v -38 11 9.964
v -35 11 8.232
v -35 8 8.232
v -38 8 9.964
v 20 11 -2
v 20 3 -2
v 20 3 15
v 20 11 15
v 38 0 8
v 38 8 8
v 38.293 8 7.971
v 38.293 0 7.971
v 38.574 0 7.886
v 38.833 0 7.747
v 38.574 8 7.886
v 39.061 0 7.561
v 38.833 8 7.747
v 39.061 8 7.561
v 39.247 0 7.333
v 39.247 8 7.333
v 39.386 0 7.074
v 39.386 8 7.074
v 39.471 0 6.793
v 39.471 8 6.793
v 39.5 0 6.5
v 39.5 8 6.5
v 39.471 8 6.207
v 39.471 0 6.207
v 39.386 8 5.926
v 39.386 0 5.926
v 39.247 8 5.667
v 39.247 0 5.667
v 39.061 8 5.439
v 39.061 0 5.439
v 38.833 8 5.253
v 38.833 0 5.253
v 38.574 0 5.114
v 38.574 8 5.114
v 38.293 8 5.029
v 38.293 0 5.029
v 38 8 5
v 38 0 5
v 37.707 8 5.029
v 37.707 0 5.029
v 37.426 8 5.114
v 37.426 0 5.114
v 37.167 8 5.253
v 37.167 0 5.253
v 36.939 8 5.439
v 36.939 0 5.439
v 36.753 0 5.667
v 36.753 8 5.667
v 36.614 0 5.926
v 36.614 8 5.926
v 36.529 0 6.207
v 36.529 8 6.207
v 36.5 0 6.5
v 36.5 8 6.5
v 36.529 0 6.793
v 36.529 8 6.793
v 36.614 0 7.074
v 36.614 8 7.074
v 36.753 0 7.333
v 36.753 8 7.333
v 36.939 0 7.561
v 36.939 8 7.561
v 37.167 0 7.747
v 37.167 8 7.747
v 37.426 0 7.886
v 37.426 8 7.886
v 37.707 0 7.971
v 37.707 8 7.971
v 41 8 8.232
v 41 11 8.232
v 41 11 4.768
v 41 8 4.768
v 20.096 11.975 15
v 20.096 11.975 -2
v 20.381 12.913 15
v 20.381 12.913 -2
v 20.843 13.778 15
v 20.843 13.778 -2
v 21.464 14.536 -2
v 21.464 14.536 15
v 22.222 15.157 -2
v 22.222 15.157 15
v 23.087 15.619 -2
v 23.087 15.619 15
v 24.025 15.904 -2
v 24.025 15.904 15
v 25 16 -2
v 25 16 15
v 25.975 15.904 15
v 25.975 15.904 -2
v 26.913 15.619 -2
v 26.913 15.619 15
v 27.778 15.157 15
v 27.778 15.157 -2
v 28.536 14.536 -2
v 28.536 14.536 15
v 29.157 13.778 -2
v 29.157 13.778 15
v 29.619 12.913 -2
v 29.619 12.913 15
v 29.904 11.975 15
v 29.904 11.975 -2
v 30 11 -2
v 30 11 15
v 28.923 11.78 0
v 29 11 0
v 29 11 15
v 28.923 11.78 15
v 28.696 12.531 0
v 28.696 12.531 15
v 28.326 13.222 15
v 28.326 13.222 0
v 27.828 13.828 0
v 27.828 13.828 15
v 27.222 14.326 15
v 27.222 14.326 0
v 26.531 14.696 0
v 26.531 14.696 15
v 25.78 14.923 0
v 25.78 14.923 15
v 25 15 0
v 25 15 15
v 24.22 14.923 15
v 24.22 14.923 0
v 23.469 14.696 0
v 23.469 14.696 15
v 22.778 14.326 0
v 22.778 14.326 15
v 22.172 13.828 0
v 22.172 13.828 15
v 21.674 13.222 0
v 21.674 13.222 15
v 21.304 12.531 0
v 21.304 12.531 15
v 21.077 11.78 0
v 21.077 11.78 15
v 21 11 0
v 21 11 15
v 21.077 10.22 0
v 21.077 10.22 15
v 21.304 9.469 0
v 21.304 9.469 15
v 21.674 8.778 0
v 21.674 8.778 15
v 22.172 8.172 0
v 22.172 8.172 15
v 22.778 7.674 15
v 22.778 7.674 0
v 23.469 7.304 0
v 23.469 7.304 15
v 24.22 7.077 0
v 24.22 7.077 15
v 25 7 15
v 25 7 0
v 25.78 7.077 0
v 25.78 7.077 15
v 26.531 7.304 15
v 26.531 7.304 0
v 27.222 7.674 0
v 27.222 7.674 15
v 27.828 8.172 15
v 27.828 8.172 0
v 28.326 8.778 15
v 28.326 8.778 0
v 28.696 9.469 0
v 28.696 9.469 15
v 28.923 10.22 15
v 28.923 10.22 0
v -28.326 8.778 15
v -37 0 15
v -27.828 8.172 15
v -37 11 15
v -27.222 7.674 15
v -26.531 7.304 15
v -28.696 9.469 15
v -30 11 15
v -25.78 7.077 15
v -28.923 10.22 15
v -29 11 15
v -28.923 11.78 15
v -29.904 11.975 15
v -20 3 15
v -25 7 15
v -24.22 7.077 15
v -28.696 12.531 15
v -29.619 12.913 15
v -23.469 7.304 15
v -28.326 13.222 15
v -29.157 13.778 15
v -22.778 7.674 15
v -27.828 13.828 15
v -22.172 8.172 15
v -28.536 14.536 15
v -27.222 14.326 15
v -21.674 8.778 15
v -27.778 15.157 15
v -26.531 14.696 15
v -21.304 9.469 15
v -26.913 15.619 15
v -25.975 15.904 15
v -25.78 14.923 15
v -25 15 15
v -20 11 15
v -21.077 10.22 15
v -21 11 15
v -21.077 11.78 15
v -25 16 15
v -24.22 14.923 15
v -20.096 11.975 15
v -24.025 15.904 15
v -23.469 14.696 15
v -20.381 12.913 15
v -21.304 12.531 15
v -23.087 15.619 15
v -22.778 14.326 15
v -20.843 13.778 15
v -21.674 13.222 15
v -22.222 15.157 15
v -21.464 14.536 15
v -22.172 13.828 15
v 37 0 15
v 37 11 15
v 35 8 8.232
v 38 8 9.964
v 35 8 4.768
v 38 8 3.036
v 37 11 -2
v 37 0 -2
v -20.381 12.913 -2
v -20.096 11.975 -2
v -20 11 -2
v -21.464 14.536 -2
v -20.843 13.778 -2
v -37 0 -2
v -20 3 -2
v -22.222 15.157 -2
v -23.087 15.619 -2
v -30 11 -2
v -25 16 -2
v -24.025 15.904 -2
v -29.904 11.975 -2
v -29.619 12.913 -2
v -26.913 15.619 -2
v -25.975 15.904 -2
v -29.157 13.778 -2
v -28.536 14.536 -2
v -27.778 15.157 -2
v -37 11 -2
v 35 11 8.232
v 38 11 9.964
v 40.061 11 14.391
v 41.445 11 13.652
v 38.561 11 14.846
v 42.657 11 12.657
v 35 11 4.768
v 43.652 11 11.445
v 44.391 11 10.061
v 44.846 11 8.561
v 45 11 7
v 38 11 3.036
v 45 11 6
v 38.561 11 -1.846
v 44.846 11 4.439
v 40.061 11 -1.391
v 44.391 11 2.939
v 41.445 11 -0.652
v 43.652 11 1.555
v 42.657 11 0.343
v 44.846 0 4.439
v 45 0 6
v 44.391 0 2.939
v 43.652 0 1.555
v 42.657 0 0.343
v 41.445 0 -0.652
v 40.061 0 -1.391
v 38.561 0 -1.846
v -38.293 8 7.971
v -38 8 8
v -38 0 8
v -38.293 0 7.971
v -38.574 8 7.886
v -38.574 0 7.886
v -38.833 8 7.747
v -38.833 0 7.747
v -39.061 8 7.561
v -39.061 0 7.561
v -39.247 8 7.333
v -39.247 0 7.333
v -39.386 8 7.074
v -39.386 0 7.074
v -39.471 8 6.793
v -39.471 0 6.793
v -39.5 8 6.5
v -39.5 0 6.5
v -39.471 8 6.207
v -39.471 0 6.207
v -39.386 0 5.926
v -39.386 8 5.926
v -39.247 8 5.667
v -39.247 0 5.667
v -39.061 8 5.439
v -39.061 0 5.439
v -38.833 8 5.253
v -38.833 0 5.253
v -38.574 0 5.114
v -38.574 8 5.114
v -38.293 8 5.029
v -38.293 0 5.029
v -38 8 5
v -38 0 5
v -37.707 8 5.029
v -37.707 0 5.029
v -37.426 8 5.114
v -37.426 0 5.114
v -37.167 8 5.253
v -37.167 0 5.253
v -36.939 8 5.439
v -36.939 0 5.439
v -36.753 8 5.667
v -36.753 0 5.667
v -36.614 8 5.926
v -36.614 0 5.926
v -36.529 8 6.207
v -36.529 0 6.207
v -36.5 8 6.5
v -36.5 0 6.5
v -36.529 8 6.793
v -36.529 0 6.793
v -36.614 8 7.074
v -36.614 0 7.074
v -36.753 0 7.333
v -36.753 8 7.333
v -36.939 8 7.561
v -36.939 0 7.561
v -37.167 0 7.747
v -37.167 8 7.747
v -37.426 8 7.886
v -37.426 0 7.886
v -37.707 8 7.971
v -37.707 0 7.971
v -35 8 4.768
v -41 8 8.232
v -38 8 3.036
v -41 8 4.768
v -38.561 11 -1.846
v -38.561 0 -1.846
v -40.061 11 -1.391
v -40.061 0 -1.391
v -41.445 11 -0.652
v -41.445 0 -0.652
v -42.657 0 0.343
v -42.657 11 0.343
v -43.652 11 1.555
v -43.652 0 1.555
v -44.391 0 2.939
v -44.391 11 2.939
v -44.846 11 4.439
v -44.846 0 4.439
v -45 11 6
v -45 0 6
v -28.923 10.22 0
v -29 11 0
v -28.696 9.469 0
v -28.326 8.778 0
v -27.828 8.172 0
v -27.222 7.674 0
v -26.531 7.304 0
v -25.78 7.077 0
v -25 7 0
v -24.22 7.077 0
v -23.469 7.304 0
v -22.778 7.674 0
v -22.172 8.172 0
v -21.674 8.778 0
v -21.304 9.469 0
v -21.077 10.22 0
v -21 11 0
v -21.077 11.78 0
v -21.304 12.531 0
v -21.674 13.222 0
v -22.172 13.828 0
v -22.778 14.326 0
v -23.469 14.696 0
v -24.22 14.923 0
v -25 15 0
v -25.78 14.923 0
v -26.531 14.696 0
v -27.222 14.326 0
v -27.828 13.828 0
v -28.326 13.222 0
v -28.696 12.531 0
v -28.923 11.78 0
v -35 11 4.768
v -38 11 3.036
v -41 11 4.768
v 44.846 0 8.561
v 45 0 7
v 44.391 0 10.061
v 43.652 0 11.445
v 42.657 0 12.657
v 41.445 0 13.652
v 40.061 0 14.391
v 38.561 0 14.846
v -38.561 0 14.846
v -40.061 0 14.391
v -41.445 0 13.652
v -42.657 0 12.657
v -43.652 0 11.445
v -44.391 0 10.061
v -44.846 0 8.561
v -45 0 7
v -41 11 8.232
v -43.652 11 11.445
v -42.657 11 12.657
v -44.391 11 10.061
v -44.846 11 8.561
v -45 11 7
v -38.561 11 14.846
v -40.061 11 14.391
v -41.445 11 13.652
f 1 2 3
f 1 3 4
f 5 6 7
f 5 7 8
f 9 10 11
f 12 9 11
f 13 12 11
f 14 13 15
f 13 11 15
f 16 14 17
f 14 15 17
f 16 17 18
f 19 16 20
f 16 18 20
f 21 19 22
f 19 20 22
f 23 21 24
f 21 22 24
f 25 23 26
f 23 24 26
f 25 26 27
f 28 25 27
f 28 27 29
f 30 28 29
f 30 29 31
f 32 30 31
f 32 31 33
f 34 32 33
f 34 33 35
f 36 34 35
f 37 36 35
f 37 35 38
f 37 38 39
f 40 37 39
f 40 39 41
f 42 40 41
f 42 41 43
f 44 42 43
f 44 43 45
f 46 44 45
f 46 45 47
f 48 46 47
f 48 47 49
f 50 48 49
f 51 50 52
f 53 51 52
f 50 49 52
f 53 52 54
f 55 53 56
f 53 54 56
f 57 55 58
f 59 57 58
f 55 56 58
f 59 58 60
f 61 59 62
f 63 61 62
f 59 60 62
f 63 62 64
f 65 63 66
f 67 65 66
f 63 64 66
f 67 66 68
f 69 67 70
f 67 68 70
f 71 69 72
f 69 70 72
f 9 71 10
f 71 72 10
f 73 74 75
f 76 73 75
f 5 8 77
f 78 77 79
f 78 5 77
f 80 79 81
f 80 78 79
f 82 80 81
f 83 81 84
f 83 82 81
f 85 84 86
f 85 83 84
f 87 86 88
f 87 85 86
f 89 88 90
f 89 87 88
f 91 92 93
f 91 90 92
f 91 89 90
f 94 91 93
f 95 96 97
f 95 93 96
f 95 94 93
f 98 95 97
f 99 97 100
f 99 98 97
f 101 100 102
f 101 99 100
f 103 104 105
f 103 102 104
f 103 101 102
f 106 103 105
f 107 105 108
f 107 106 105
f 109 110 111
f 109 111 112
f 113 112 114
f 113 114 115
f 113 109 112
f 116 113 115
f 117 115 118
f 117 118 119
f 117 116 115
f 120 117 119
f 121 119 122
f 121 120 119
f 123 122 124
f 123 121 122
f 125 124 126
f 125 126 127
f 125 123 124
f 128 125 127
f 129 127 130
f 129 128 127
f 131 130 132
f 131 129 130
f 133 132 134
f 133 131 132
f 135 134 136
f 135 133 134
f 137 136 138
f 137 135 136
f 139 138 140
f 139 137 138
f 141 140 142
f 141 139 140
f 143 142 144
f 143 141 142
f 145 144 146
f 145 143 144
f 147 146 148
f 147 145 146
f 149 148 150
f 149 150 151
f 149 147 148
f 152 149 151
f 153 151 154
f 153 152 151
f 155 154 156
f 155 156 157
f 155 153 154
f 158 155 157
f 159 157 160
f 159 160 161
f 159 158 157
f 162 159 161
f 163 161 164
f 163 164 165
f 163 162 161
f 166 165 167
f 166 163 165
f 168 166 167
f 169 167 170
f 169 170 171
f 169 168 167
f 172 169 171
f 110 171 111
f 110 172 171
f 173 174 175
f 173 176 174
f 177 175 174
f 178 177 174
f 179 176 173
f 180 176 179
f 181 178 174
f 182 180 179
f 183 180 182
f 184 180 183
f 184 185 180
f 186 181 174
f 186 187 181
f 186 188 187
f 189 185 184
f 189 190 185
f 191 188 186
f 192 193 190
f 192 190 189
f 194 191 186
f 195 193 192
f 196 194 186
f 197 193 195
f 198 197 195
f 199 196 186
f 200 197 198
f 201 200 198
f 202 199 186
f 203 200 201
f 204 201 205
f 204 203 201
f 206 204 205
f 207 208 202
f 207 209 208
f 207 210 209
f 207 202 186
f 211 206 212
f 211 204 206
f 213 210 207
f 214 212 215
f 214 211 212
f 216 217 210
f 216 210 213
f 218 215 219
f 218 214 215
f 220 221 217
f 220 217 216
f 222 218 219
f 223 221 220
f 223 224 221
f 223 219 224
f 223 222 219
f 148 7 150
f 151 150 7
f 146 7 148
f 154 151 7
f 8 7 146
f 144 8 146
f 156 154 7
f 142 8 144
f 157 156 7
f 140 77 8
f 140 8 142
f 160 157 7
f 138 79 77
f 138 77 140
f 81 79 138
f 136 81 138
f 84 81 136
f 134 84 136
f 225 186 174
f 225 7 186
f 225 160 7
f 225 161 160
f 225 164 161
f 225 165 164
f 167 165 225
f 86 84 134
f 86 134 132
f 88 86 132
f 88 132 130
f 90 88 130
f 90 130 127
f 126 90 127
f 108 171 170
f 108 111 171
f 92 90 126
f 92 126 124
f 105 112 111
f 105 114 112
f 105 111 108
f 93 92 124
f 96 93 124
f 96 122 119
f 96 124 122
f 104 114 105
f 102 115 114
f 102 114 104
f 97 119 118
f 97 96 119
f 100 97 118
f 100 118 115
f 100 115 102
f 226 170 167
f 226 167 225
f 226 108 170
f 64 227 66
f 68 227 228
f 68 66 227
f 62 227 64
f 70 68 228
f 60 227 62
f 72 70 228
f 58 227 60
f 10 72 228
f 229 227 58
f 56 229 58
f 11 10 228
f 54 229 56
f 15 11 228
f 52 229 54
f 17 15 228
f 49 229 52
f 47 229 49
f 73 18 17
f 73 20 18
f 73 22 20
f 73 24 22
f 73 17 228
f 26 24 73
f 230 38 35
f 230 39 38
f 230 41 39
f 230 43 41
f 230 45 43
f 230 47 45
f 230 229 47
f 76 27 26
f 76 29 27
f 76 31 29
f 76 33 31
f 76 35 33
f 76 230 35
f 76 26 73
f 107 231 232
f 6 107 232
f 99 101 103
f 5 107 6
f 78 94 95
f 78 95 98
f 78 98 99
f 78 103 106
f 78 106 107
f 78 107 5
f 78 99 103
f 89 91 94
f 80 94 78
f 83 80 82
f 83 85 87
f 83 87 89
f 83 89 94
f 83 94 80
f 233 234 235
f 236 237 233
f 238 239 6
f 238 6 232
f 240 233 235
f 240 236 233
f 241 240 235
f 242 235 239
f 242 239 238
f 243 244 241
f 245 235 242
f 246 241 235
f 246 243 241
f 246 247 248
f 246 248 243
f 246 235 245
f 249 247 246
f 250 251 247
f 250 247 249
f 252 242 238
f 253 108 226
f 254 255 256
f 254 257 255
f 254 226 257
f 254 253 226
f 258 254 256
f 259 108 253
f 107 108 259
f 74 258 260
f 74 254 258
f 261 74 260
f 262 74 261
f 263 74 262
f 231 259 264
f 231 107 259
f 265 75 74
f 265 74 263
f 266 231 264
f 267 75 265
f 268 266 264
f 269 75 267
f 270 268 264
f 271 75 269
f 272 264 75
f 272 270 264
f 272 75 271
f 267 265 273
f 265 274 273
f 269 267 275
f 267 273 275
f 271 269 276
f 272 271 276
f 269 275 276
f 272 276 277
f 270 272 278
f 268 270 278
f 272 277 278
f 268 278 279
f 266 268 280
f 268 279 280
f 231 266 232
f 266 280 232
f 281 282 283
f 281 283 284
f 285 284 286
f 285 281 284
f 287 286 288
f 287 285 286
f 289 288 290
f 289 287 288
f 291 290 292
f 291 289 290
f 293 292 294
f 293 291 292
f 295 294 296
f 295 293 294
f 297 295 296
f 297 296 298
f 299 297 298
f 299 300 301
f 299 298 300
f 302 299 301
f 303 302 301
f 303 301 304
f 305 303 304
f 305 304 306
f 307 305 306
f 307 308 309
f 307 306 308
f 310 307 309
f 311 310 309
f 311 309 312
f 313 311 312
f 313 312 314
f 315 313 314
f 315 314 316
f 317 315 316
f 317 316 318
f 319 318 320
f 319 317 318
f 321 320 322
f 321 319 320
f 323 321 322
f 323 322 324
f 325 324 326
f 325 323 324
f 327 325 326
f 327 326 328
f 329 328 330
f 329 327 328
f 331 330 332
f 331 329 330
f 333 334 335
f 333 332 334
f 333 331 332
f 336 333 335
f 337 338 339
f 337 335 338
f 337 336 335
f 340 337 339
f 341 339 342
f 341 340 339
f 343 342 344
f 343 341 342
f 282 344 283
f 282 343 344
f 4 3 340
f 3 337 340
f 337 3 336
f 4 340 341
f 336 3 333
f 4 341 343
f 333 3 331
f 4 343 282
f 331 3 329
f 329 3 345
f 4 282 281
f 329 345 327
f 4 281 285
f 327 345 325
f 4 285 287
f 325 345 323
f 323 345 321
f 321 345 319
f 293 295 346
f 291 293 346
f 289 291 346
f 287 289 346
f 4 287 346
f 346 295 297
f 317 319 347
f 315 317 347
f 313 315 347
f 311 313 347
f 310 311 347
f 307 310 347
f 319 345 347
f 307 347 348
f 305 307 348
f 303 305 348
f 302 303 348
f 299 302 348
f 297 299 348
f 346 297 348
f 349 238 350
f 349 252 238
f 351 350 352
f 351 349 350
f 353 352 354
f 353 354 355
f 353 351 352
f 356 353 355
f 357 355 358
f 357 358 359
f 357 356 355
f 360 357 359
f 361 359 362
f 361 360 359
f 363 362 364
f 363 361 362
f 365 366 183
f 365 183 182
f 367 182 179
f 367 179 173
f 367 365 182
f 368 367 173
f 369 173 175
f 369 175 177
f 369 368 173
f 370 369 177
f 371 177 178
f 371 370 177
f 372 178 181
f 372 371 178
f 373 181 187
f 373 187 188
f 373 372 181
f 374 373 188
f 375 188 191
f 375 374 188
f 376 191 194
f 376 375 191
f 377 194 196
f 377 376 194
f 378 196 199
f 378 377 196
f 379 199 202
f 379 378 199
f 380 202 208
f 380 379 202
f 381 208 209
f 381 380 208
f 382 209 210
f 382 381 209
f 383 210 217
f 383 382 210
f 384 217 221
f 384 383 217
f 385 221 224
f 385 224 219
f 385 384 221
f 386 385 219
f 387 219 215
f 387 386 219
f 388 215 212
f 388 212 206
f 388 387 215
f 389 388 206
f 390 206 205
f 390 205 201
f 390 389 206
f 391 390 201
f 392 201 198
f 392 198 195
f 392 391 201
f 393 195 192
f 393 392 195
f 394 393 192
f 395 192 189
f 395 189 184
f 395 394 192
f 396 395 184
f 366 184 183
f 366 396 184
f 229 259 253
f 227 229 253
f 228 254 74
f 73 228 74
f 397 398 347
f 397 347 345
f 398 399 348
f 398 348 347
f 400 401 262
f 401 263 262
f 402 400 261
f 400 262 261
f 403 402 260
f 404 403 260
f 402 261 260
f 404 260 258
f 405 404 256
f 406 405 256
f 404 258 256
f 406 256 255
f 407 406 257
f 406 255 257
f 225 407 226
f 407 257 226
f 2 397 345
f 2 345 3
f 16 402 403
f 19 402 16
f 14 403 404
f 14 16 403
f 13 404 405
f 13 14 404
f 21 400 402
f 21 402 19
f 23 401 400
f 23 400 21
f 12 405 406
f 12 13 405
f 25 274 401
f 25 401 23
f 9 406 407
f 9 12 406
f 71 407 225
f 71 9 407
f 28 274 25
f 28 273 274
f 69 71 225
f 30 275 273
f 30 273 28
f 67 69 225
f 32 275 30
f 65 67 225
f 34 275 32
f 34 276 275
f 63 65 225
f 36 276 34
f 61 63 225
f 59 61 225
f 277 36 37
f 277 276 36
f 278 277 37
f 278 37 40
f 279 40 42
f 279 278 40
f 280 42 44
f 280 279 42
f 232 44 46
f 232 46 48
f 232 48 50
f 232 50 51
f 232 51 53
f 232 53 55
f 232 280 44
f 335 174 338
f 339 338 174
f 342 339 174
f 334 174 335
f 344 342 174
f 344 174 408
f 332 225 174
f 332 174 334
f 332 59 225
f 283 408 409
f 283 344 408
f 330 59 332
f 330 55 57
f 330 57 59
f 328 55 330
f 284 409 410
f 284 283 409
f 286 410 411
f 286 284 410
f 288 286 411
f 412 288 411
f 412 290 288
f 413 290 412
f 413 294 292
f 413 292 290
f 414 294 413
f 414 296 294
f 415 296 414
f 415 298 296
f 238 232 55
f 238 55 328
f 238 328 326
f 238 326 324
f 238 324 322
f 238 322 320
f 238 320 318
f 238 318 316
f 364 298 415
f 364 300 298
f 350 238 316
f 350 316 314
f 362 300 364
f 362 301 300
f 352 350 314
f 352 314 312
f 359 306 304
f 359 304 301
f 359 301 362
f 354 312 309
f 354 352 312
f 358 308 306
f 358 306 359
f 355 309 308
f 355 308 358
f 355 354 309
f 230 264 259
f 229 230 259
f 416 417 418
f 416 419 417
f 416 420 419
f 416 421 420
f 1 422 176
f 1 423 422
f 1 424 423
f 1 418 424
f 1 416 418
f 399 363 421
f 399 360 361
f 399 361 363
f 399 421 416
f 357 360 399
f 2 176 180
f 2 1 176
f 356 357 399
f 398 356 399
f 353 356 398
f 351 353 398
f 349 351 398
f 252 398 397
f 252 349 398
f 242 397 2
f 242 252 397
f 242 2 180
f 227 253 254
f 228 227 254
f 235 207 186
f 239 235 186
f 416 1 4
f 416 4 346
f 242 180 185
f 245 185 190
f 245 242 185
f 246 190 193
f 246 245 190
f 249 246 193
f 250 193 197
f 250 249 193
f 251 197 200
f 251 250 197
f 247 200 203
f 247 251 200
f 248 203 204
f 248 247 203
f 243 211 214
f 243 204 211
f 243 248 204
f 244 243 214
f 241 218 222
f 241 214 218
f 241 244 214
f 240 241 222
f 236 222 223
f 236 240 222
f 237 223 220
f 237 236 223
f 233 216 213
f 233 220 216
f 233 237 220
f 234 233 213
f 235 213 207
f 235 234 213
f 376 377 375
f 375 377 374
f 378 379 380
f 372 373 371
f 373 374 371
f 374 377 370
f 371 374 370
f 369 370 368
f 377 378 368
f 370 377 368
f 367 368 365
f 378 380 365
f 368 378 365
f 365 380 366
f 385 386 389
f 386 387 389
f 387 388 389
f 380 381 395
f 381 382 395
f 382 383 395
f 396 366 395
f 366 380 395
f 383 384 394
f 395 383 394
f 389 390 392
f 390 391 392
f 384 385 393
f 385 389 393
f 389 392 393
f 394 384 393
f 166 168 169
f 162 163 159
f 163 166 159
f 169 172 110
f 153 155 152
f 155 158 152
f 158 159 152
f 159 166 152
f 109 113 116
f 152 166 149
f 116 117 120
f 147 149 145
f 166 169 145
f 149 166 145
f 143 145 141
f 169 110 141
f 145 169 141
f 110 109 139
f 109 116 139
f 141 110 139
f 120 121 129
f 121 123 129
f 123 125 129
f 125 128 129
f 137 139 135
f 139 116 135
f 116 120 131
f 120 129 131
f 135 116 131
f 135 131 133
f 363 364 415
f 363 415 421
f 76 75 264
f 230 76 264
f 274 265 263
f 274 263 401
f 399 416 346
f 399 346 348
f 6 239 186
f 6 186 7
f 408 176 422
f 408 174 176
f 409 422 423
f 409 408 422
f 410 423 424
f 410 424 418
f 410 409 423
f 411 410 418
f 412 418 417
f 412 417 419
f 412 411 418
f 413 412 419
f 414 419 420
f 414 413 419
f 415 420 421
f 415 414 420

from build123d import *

# Parameters (mm, degrees)
SKETCH1_R           = 4
BOSS_EXTRUDE1_DEPTH = 15
BOSS_EXTRUDE2_START = 2
BOSS_EXTRUDE2_DEPTH = 2
SKETCH3_R           = 1.5
CUT_EXTRUDE1_DEPTH  = 49.692915296
FILLET1_R           = 8
CUT_EXTRUDE2_DEPTH  = 3


with BuildPart() as part:
    # Sketch1 → Boss-Extrude1 (new body)
    with BuildSketch(Plane.XY):
        with BuildLine():
            Line((-45, 0), (45, 0))
            Line((45, 0), (45, 11))
            Line((45, 11), (30, 11))
            ThreePointArc((30, 11), (25, 16), (20, 11))
            Line((20, 11), (20, 3))
            Line((20, 3), (-20, 3))
            Line((-20, 3), (-20, 11))
            ThreePointArc((-20, 11), (-25, 16), (-30, 11))
            Line((-30, 11), (-45, 11))
            Line((-45, 11), (-45, 0))
        make_face()
        with Locations((25, 11)):
            Circle(SKETCH1_R, mode=Mode.SUBTRACT)
        with Locations(Location((-25, 11, 0), (0, 0, 180))):
            Circle(SKETCH1_R, mode=Mode.SUBTRACT)
    extrude(amount=BOSS_EXTRUDE1_DEPTH)

    # Sketch2 → Boss-Extrude2 (add)
    with BuildSketch(Plane(origin=(0, 0, 0), x_dir=(-1, 0, 0), z_dir=(0, 0, -1)).offset(BOSS_EXTRUDE2_START)):
        with BuildLine():
            Line((-45, 11), (-45, 0))
            Line((-45, 0), (45, 0))
            Line((45, 0), (45, 11))
            Line((45, 11), (30, 11))
            ThreePointArc((30, 11), (25, 16), (20, 11))
            Line((20, 11), (20, 3))
            Line((20, 3), (-20, 3))
            Line((-20, 3), (-20, 11))
            ThreePointArc((-20, 11), (-25, 16), (-30, 11))
            Line((-30, 11), (-45, 11))
        make_face()
    extrude(amount=-BOSS_EXTRUDE2_DEPTH)

    # Sketch3 → Cut-Extrude1 (cut, through all)
    with BuildSketch(Plane(origin=(0, 11, 0), x_dir=(1, 0, 0), z_dir=(0, 1, 0))):
        with Locations(Location((38, -6.5, 0), (0, 0, 270))):
            Circle(SKETCH3_R)
    cut_extrude1 = extrude(amount=-CUT_EXTRUDE1_DEPTH, mode=Mode.SUBTRACT)

    # Mirror1: Cut-Extrude1 across plane
    add(cut_extrude1.mirror(Plane(origin=(0, 0, 0), x_dir=(0, 0, 1), z_dir=(1, 0, 0))), mode=Mode.SUBTRACT)

    # Fillet1
    fillet1_edges = [part.edges().sort_by_distance(p)[0] for p in [
        (-45, 5.5, 15),
        (45, 5.5, 15),
        (45, 5.5, -2),
        (-45, 5.5, -2),
    ]]
    fillet(fillet1_edges, radius=FILLET1_R)

    # Sketch4 → Cut-Extrude2 (cut)
    with BuildSketch(Plane(origin=(0, 11, 0), x_dir=(1, 0, 0), z_dir=(0, 1, 0))):
        Polygon((38, -3.035898385), (35, -4.767949192), (35, -8.232050808), (38, -9.964101615), (41, -8.232050808), (41, -4.767949192), align=None)
    cut_extrude2 = extrude(amount=-CUT_EXTRUDE2_DEPTH, mode=Mode.SUBTRACT)

    # Mirror3: Cut-Extrude2 across plane
    add(cut_extrude2.mirror(Plane(origin=(0, 0, 0), x_dir=(0, 0, 1), z_dir=(1, 0, 0))), mode=Mode.SUBTRACT)


solid = part.part
